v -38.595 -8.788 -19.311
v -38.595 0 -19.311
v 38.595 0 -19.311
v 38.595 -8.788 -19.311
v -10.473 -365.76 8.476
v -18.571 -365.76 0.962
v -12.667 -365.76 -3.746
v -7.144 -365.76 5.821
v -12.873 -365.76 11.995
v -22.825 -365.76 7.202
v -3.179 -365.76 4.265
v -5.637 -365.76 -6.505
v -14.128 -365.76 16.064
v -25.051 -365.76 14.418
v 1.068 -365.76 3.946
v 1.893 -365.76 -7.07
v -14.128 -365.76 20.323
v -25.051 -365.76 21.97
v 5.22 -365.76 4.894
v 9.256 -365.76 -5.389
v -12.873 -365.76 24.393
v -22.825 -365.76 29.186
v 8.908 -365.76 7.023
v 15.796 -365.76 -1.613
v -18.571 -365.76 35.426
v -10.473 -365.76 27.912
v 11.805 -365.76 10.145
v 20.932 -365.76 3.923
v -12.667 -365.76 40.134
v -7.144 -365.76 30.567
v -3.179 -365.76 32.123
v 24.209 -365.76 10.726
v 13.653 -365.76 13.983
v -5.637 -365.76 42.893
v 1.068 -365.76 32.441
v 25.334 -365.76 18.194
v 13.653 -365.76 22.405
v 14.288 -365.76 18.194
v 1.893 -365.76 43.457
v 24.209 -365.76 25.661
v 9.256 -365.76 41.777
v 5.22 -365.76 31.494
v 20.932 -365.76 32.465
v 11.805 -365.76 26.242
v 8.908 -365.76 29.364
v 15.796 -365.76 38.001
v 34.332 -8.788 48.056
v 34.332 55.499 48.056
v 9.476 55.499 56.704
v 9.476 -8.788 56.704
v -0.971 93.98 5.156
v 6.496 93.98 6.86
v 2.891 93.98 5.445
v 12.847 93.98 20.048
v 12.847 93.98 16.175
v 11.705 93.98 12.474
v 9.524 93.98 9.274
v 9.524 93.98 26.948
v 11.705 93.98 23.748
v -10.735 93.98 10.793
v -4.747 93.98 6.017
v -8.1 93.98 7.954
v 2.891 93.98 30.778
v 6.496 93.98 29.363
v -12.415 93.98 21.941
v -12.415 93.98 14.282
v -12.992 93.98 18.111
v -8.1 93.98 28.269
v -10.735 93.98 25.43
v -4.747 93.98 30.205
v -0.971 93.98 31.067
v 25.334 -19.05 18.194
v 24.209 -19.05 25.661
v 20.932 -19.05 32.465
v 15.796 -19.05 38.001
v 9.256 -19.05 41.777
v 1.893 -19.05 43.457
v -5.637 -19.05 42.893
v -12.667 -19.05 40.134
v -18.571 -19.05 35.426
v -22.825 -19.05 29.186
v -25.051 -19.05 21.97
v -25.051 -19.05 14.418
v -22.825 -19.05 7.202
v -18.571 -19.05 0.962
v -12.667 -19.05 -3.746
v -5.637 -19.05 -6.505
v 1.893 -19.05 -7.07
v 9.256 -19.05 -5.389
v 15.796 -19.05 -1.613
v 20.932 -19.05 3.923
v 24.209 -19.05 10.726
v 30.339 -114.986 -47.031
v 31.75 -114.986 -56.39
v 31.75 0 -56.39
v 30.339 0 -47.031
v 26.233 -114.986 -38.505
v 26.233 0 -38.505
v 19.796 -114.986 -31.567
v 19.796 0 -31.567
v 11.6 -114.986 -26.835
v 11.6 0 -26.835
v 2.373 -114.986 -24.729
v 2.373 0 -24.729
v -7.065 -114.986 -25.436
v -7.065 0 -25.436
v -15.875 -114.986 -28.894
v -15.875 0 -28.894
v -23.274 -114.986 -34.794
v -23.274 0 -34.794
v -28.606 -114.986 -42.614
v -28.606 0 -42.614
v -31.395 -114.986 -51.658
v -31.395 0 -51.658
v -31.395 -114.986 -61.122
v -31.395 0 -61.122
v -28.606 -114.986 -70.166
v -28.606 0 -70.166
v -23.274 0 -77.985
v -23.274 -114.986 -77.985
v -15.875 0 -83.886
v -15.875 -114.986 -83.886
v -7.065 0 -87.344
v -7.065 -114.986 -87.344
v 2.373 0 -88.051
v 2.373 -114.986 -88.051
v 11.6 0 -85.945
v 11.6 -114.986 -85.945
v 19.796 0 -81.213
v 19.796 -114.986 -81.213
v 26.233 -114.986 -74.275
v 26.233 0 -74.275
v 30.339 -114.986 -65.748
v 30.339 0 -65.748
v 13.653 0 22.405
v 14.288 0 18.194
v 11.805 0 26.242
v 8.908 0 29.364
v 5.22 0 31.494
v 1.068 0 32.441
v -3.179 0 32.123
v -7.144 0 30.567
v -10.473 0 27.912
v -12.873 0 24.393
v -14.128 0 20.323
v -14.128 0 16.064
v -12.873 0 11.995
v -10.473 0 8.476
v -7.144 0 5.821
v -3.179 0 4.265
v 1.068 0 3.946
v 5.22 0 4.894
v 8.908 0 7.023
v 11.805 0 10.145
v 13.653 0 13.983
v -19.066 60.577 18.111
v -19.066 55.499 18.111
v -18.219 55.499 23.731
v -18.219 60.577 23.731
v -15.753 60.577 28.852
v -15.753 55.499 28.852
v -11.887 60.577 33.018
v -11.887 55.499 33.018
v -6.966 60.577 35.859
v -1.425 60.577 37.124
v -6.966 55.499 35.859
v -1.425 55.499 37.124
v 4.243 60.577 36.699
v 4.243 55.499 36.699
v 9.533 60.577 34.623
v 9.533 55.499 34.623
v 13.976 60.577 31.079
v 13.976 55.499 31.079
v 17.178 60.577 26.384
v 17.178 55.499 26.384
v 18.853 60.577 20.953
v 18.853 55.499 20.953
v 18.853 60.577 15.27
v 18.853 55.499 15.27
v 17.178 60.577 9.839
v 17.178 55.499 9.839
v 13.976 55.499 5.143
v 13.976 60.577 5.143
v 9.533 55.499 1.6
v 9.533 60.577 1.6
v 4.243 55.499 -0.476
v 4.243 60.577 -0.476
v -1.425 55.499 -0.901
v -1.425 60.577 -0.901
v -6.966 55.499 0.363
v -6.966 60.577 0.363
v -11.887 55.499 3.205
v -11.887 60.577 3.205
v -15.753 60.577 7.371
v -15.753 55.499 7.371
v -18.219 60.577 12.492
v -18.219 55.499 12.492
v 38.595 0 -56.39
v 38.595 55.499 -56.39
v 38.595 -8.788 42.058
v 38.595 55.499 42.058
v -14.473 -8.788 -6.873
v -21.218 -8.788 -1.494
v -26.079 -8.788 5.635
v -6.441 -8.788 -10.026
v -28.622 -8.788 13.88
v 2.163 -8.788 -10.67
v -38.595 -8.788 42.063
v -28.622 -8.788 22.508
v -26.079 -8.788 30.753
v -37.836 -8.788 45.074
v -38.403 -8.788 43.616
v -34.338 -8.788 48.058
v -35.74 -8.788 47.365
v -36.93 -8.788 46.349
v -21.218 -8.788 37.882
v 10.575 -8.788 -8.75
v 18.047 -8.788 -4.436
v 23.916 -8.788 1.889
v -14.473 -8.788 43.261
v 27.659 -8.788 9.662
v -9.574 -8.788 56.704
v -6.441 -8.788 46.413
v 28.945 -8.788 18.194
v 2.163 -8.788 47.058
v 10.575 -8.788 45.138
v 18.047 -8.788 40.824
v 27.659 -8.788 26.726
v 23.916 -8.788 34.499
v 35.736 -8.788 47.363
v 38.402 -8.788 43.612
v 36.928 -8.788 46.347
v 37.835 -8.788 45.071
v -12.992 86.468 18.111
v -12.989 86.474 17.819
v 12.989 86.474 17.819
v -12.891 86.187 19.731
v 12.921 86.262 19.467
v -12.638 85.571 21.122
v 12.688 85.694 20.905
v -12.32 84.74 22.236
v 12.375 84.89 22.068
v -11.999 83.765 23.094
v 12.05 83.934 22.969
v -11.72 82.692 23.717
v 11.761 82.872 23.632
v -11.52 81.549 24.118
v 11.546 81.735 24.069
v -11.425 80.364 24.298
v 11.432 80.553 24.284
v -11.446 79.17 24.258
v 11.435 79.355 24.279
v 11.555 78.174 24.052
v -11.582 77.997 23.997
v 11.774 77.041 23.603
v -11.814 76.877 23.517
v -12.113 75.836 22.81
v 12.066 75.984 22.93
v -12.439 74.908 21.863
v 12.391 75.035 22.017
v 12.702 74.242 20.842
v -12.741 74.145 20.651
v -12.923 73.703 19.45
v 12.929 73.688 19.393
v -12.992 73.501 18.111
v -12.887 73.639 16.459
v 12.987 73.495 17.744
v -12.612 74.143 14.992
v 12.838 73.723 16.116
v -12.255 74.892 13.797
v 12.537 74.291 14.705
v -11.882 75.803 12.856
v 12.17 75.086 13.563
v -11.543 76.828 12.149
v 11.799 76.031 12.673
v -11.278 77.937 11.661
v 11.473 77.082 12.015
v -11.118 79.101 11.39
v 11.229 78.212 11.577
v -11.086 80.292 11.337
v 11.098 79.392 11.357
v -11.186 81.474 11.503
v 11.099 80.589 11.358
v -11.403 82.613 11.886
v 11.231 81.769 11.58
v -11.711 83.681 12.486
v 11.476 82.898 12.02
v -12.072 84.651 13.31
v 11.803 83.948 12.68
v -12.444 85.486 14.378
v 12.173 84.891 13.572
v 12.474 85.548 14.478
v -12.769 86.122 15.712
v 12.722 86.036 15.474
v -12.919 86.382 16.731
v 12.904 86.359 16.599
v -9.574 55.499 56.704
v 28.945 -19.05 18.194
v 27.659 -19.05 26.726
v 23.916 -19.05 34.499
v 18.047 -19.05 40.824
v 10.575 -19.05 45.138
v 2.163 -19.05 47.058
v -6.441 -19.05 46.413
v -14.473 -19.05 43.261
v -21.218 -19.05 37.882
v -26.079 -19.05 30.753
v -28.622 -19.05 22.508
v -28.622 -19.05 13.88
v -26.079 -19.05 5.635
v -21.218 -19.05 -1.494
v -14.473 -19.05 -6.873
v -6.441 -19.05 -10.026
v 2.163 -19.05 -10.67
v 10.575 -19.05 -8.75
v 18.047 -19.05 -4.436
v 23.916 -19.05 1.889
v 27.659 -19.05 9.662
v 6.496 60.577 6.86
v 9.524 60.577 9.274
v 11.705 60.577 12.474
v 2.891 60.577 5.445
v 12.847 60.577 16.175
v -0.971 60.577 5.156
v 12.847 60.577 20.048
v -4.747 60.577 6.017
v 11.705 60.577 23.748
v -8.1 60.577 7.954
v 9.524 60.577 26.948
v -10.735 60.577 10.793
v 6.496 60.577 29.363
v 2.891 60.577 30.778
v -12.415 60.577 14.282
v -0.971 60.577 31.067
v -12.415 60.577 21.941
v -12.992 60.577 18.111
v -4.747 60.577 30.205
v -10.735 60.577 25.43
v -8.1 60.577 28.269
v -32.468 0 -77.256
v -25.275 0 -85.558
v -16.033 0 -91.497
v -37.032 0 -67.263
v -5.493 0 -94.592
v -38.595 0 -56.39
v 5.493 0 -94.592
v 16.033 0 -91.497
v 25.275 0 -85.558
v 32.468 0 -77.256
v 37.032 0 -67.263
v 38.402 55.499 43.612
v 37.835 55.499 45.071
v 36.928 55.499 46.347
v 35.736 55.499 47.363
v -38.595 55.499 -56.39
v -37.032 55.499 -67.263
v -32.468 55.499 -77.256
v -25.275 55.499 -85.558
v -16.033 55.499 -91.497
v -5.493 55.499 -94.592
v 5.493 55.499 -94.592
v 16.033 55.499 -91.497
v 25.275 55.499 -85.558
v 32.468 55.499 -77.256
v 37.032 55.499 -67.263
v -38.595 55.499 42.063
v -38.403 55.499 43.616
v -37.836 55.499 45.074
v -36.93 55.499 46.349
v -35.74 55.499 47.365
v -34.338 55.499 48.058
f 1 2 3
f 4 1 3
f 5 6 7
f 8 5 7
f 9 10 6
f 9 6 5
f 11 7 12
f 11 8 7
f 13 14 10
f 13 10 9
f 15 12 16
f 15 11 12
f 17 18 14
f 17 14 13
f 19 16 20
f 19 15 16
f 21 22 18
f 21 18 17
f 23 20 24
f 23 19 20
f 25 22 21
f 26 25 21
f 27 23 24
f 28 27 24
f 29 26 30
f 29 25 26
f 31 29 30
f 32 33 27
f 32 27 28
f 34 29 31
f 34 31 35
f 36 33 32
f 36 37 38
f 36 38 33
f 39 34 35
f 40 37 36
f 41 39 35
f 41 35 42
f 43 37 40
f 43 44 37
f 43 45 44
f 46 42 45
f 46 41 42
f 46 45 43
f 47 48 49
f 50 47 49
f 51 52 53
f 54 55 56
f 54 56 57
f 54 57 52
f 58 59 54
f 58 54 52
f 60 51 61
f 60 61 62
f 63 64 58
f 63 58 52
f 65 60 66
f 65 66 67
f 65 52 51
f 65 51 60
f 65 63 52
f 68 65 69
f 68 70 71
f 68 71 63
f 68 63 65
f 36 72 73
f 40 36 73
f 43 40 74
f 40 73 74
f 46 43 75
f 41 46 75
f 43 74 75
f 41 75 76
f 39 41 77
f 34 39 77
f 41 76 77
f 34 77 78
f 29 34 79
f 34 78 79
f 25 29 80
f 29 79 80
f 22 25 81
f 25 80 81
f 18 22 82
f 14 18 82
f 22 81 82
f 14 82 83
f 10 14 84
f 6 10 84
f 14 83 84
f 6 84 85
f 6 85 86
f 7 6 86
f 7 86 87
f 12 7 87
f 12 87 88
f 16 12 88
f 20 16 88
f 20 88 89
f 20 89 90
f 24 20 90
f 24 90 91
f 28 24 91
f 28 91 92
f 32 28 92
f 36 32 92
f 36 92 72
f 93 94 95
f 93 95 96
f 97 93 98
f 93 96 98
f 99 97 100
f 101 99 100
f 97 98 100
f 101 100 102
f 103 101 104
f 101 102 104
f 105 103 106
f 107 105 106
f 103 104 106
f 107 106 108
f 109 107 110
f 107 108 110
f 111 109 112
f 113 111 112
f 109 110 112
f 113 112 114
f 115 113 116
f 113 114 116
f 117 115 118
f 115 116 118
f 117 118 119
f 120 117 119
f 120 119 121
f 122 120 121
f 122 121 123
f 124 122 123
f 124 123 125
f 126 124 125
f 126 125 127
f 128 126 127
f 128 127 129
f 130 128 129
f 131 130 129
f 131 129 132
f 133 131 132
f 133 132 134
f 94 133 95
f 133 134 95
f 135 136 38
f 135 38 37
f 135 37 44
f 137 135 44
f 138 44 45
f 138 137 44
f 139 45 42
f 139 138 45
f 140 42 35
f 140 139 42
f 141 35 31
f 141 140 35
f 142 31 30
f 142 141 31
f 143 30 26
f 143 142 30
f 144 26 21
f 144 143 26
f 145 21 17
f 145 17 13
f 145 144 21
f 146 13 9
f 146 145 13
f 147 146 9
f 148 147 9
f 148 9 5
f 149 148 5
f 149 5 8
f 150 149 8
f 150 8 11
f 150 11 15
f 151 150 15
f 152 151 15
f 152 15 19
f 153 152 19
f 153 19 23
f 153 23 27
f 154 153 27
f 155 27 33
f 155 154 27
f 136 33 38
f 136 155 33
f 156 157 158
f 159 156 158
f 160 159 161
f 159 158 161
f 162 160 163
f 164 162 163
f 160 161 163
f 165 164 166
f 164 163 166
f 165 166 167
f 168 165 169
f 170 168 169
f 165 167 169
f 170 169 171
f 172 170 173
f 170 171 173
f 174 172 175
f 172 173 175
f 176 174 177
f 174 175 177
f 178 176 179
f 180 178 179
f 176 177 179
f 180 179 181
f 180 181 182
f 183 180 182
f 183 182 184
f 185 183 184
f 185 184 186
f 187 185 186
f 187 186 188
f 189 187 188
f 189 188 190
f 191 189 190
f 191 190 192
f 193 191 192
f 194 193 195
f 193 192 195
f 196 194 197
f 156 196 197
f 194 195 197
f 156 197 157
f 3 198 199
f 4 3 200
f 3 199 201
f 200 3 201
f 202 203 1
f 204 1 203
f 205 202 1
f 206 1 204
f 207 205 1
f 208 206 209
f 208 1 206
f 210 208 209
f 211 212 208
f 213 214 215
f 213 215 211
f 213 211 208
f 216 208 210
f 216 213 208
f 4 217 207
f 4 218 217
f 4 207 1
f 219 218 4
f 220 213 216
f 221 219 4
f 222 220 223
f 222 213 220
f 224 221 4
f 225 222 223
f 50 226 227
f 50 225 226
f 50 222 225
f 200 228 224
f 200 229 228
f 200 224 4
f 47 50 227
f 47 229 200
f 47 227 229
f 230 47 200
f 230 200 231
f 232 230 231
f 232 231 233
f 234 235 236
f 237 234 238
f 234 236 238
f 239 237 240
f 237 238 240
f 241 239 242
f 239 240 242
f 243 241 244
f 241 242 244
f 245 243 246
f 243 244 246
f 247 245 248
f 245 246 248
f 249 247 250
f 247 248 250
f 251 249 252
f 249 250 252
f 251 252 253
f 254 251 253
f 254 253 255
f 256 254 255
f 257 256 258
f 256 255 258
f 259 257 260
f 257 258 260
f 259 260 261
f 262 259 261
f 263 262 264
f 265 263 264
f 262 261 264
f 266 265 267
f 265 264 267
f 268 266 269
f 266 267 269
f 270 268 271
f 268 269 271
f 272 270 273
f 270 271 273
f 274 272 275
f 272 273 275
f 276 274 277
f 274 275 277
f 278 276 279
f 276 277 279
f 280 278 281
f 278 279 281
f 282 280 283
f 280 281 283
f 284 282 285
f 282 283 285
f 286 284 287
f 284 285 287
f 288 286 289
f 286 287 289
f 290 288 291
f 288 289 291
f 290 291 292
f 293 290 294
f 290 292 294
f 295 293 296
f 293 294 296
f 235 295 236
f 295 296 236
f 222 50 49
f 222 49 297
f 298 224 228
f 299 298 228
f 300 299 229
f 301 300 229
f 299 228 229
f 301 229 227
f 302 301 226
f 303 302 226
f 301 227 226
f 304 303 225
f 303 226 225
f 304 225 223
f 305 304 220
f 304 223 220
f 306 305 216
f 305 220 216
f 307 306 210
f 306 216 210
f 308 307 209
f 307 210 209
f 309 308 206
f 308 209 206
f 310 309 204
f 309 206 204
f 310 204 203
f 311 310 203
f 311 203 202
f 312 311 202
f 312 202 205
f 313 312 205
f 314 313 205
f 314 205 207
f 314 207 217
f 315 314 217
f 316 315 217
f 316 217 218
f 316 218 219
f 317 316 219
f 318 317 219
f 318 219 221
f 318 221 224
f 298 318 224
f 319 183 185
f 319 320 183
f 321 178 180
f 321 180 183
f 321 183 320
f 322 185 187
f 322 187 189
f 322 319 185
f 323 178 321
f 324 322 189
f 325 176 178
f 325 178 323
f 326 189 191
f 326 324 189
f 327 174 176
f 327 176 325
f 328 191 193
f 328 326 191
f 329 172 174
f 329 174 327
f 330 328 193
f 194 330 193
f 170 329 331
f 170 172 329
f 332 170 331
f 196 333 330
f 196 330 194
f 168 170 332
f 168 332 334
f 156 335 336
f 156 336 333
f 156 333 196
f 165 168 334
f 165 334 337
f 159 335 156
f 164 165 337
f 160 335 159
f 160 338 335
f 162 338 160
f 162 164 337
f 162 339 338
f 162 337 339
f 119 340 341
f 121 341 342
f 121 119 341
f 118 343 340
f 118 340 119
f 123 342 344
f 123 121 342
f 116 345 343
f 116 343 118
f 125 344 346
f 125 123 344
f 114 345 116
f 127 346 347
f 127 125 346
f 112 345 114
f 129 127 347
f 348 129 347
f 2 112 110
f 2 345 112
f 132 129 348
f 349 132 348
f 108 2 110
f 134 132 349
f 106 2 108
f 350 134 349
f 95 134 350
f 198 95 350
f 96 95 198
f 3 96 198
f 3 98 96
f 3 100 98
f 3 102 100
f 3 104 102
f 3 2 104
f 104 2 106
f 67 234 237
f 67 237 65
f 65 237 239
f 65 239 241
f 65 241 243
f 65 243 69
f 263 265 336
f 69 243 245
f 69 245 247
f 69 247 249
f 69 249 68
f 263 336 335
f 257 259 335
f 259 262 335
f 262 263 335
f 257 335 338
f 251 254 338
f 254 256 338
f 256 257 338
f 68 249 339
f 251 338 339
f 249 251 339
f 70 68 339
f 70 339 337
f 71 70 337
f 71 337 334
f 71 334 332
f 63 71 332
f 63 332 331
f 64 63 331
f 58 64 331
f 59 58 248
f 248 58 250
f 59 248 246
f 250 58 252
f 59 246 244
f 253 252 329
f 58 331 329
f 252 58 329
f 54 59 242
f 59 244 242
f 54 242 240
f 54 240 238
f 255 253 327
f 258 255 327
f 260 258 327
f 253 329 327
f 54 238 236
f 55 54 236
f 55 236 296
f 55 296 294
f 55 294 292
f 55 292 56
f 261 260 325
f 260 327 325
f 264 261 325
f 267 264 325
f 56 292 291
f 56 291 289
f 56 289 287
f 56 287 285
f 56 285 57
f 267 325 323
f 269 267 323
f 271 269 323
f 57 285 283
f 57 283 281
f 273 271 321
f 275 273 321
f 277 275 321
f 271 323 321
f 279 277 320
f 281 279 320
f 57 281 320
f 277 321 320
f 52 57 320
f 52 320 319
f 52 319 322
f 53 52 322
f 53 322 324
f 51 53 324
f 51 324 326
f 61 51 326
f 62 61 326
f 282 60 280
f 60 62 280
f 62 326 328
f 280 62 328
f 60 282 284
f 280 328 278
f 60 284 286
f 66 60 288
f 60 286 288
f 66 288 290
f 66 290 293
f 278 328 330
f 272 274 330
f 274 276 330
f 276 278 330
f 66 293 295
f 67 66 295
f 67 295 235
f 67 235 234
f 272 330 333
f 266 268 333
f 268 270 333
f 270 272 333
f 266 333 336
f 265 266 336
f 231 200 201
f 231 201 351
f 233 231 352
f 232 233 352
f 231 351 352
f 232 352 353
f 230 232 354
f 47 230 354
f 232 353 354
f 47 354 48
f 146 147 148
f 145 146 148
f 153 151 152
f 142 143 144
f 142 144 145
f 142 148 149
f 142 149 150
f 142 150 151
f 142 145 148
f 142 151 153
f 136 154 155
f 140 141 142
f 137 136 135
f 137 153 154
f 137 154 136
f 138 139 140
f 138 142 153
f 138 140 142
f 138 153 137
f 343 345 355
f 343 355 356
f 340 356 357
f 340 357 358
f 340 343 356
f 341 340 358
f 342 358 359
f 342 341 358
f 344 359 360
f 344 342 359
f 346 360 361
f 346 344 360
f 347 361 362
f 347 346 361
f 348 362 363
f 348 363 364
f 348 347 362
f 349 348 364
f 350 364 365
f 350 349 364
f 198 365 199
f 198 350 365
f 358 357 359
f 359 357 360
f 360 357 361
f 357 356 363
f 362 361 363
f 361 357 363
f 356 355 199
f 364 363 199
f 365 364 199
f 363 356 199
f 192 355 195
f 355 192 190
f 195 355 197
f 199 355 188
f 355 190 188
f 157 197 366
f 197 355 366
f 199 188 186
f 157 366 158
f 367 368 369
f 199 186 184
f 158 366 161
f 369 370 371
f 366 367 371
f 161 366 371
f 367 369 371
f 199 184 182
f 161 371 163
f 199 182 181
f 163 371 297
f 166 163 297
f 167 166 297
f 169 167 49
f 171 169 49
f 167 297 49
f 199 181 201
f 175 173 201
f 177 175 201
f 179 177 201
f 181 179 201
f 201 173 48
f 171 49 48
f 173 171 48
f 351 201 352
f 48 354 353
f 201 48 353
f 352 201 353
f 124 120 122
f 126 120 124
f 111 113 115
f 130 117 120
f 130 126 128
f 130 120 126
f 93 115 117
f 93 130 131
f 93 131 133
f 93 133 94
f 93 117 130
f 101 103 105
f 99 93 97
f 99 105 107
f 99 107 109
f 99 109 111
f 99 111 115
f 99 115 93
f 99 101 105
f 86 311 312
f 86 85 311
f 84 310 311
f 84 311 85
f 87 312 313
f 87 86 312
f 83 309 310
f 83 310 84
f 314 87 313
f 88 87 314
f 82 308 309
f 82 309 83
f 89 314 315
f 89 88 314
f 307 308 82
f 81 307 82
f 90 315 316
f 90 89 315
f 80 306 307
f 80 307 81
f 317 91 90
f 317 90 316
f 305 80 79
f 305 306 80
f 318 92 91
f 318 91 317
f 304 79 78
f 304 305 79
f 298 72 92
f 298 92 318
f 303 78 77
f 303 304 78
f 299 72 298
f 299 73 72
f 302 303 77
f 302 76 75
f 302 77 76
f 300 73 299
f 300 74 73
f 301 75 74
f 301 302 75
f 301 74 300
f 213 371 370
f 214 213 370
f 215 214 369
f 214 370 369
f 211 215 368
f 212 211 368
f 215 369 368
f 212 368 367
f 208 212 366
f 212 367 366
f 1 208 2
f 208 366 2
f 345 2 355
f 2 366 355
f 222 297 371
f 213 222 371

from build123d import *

# Parameters (mm, degrees)
F0_R      = 28.9450820598
F0_R_2    = 31.75
F0_R_3    = 25.3342985941
F0_R_4    = 14.2875
F1_DEPTH  = 55.499
F2_DEPTH  = 114.9858
F3_DEPTH  = 365.76
F4_DEPTH  = 8.7884
F5_DEPTH  = 19.05
F6_R      = 12.9921
F7_DEPTH  = 38.481
F6_R_2    = 19.0658392813
F8_DEPTH  = 5.07789
F9_R      = 6.4897
F10_DEPTH = 25.4
F11_DEPTH = 25.4


with BuildPart() as f1:
    # F0 (on Front) → F1 (new body)
    with BuildSketch(Plane.XZ):
        with BuildLine():
            ThreePointArc((-34.3382090481, 48.0584091192), (-37.4227739234, 45.7396722427), (-38.5953, 42.0632250756))
            Line((-38.5953, 42.0632250756), (-38.5953, -19.3111319095))
            Line((-38.5953, -19.3111319095), (38.5953, -19.3111319095))
            Line((38.5953, -19.3111319095), (38.5953, 42.0582217318))
            ThreePointArc((38.5953, 42.0582217318), (37.4208481647, 45.7373794064), (34.331929545, 48.0555942517))
            Line((34.331929545, 48.0555942517), (9.4760187225, 56.7035609601))
            Line((9.4760187225, 56.7035609601), (-9.5739812775, 56.7035609601))
            Line((-9.5739812775, 56.7035609601), (-34.3382090481, 48.0584091192))
        make_face()
        with Locations((0, 18.1938651949)):
            Circle(F0_R, mode=Mode.SUBTRACT)
        with BuildLine():
            Line((38.5953, -19.3111319095), (-38.5953, -19.3111319095))
            Line((-38.5953, -19.3111319095), (-38.5953, -56.3899390399))
            ThreePointArc((-38.5953, -56.3899390399), (0, -94.9852390399), (38.5953, -56.3899390399))
            Line((38.5953, -56.3899390399), (38.5953, -19.3111319095))
        make_face()
        with Locations((0, -56.3899390399)):
            Circle(F0_R_2, mode=Mode.SUBTRACT)
        with Locations((0, -56.3899390399)):
            Circle(F0_R_2)
        with Locations((0, 18.1938651949)):
            Circle(F0_R)
        with Locations((0, 18.1938651949)):
            Circle(F0_R_3, mode=Mode.SUBTRACT)
        with Locations((0, 18.1938651949)):
            Circle(F0_R_3)
        with Locations((0, 18.1938651949)):
            Circle(F0_R_4, mode=Mode.SUBTRACT)
        with Locations((0, 18.1938651949)):
            Circle(F0_R_4)
    extrude(amount=-F1_DEPTH)

    # F0 (on Front) → F2 (join)
    with BuildSketch(Plane.XZ):
        with Locations((0, -56.3899390399)):
            Circle(F0_R_2)
    extrude(amount=F2_DEPTH)

    # F0 (on Front) → F3 (join)
    with BuildSketch(Plane.XZ):
        with Locations((0, 18.1938651949)):
            Circle(F0_R_3)
        with Locations((0, 18.1938651949)):
            Circle(F0_R_4, mode=Mode.SUBTRACT)
    extrude(amount=F3_DEPTH)

    # F0 (on Front) → F4 (join)
    with BuildSketch(Plane.XZ):
        with BuildLine():
            ThreePointArc((-34.3382090481, 48.0584091192), (-37.4227739234, 45.7396722427), (-38.5953, 42.0632250756))
            Line((-38.5953, 42.0632250756), (-38.5953, -19.3111319095))
            Line((-38.5953, -19.3111319095), (38.5953, -19.3111319095))
            Line((38.5953, -19.3111319095), (38.5953, 42.0582217318))
            ThreePointArc((38.5953, 42.0582217318), (37.4208481647, 45.7373794064), (34.331929545, 48.0555942517))
            Line((34.331929545, 48.0555942517), (9.4760187225, 56.7035609601))
            Line((9.4760187225, 56.7035609601), (-9.5739812775, 56.7035609601))
            Line((-9.5739812775, 56.7035609601), (-34.3382090481, 48.0584091192))
        make_face()
        with Locations((0, 18.1938651949)):
            Circle(F0_R, mode=Mode.SUBTRACT)
    extrude(amount=F4_DEPTH)

    # F0 (on Front) → F5 (join)
    with BuildSketch(Plane.XZ):
        with Locations((0, 18.1938651949)):
            Circle(F0_R)
        with Locations((0, 18.1938651949)):
            Circle(F0_R_3, mode=Mode.SUBTRACT)
    extrude(amount=F5_DEPTH)

    # F6 (on face) → F7 (join)
    with BuildSketch(Plane(origin=(0, 55.499, 0), x_dir=(-1, 0, 0), z_dir=(0, 1, 0))):
        with Locations((0, 18.111359328)):
            Circle(F6_R)
    extrude(amount=F7_DEPTH)

    # F6 (on face) → F8 (join)
    with BuildSketch(Plane(origin=(0, 55.499, 0), x_dir=(-1, 0, 0), z_dir=(0, 1, 0))):
        with Locations((0, 18.111359328)):
            Circle(F6_R_2)
        with Locations((0, 18.111359328)):
            Circle(F6_R, mode=Mode.SUBTRACT)
    extrude(amount=F8_DEPTH)

    # F9 (on Right) → F10 (cut)
    with BuildSketch(Plane.YZ):
        with Locations((79.9846, 17.8194735199)):
            Circle(F9_R)
    extrude(amount=-F10_DEPTH, mode=Mode.SUBTRACT)

    # F9 (on Right) → F11 (cut, symmetric)
    with BuildSketch(Plane.YZ):
        with Locations((79.9846, 17.8194735199)):
            Circle(F9_R)
    extrude(amount=F11_DEPTH, both=True, mode=Mode.SUBTRACT)


solid = f1.part
